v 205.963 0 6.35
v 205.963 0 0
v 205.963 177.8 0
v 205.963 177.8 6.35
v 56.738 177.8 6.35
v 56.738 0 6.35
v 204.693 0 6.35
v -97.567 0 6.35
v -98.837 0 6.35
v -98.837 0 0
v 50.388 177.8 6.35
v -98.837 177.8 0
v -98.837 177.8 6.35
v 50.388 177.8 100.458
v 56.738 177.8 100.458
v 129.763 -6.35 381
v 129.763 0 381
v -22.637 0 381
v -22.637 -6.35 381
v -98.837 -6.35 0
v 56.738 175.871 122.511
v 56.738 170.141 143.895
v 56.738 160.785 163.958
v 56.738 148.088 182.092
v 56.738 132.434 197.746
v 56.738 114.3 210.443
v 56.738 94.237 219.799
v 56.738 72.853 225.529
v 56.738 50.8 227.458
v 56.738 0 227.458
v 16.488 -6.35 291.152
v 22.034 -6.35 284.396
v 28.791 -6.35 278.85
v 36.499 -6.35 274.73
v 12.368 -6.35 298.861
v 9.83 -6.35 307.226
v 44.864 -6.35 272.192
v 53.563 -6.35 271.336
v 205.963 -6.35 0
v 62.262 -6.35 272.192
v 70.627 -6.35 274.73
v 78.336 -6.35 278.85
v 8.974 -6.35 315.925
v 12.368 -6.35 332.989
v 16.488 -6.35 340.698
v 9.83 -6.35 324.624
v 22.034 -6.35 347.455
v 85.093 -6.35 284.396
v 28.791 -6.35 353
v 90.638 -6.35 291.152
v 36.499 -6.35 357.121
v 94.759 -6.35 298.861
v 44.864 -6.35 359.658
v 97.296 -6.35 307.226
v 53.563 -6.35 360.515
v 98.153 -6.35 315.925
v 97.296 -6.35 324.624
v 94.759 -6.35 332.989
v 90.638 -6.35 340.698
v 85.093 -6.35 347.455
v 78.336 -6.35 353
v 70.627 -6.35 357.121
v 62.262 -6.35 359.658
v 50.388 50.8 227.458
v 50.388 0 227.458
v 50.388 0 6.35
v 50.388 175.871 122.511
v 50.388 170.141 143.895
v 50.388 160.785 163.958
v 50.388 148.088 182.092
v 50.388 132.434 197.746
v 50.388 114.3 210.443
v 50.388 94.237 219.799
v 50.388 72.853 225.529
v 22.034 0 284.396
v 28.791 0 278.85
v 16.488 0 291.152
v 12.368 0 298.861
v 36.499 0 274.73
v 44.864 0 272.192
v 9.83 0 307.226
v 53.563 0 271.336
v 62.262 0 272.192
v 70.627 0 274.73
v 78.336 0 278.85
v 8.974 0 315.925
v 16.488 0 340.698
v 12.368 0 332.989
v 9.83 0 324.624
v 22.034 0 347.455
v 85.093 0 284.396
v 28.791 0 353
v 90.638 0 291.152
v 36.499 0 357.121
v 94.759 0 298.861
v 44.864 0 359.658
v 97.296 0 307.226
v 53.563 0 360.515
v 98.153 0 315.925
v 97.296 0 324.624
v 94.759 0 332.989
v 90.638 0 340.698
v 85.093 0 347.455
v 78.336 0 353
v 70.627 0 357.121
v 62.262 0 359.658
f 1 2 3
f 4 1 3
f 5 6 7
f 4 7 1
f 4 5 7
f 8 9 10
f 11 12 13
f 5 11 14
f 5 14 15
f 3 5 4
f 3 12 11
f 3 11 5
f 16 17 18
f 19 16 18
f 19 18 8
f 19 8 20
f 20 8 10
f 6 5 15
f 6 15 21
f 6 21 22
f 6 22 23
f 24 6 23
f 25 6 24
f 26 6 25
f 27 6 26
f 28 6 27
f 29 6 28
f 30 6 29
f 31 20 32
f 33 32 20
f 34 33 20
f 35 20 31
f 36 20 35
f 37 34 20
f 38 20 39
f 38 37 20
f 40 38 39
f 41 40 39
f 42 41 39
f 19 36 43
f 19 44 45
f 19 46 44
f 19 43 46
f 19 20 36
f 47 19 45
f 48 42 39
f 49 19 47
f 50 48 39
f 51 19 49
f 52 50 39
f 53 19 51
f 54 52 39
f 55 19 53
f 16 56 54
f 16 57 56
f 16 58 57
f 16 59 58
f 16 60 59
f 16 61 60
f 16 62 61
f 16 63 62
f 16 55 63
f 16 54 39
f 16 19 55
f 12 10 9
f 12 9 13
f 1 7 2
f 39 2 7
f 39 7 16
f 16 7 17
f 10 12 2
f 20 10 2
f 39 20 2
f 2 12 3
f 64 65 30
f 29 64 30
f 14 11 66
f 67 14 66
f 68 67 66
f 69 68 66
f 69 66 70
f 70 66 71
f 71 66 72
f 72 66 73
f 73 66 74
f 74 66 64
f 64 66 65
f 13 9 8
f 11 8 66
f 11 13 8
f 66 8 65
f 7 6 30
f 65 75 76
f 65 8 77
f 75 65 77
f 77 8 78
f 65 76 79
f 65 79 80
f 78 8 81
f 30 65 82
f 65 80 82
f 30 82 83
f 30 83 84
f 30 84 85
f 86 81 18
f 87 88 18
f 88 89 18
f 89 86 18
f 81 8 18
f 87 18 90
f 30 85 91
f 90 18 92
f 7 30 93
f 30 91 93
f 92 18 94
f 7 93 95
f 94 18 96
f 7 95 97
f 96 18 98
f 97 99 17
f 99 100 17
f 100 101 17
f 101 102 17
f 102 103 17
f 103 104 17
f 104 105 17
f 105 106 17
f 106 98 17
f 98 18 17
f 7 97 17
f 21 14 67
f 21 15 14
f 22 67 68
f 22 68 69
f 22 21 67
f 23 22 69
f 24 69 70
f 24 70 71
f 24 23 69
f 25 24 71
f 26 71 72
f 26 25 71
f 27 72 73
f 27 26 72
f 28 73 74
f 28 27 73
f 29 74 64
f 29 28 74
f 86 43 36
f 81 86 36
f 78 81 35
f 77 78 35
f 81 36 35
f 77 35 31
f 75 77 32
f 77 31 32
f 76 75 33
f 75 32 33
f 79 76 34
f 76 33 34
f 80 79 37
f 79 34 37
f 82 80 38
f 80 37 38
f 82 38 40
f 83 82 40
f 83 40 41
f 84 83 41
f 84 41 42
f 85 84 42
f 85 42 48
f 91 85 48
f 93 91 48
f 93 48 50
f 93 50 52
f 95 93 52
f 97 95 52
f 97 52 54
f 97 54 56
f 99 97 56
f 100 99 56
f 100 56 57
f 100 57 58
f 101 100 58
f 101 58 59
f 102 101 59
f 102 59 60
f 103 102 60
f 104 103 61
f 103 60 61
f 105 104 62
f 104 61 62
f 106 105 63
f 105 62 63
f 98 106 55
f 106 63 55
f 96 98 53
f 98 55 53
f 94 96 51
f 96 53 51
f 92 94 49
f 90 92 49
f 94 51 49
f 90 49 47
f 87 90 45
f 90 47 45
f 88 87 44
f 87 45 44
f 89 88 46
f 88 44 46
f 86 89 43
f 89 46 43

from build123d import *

# Parameters (mm, degrees)
F3_DEPTH = 6.35
F4_D     = 89.1794
F5_W     = 304.8
F5_H     = 177.8
F6_DEPTH = 6.35
F7_W     = 3.175
F7_H     = 221.1080746889
F8_DEPTH = 177.8
F9_R     = 127


# Not quite as in the source:
# - a variable given as a bare number and used for a length is read in inches; the dataset says mm whatever the document's units were


with BuildPart() as f3:
    # F1 (on Front) → F3 (new body)
    with BuildSketch(Plane.XZ):
        Polygon((129.7632297397, 381), (-22.6367702603, 381), (-98.8367702603, 0), (205.9632297397, 0), align=None)
    extrude(amount=F3_DEPTH)

    # F4 (through all)
    with Locations(Plane(origin=(0, 0, 0), x_dir=(1, 0, 0), z_dir=(0, 1, 0))):
        with Locations((53.5632297397, -315.9252)):
            Hole(F4_D / 2)

    # F5 (on Top) → F6 (join)
    with BuildSketch(Plane.XY):
        with Locations((53.5632297397, 88.9)):
            Rectangle(F5_W, F5_H)
    extrude(amount=F6_DEPTH)

    # F7 (on face) → F8 (join)
    with BuildSketch(Plane(origin=(0, 0, 0), x_dir=(-1, 0, 0), z_dir=(0, 1, 0))):
        with Locations((-55.1507297397, 116.9040373445)):
            Rectangle(F7_W, F7_H)
        with Locations((-51.9757297397, 116.9040373445)):
            Rectangle(F7_W, F7_H)
    extrude(amount=F8_DEPTH)

    # F9
    f9_edges = [f3.edges().sort_by_distance(p)[0] for p in [
        (53.56323, 177.8, 227.458075),
    ]]
    fillet(f9_edges, radius=F9_R)


solid = f3.part
